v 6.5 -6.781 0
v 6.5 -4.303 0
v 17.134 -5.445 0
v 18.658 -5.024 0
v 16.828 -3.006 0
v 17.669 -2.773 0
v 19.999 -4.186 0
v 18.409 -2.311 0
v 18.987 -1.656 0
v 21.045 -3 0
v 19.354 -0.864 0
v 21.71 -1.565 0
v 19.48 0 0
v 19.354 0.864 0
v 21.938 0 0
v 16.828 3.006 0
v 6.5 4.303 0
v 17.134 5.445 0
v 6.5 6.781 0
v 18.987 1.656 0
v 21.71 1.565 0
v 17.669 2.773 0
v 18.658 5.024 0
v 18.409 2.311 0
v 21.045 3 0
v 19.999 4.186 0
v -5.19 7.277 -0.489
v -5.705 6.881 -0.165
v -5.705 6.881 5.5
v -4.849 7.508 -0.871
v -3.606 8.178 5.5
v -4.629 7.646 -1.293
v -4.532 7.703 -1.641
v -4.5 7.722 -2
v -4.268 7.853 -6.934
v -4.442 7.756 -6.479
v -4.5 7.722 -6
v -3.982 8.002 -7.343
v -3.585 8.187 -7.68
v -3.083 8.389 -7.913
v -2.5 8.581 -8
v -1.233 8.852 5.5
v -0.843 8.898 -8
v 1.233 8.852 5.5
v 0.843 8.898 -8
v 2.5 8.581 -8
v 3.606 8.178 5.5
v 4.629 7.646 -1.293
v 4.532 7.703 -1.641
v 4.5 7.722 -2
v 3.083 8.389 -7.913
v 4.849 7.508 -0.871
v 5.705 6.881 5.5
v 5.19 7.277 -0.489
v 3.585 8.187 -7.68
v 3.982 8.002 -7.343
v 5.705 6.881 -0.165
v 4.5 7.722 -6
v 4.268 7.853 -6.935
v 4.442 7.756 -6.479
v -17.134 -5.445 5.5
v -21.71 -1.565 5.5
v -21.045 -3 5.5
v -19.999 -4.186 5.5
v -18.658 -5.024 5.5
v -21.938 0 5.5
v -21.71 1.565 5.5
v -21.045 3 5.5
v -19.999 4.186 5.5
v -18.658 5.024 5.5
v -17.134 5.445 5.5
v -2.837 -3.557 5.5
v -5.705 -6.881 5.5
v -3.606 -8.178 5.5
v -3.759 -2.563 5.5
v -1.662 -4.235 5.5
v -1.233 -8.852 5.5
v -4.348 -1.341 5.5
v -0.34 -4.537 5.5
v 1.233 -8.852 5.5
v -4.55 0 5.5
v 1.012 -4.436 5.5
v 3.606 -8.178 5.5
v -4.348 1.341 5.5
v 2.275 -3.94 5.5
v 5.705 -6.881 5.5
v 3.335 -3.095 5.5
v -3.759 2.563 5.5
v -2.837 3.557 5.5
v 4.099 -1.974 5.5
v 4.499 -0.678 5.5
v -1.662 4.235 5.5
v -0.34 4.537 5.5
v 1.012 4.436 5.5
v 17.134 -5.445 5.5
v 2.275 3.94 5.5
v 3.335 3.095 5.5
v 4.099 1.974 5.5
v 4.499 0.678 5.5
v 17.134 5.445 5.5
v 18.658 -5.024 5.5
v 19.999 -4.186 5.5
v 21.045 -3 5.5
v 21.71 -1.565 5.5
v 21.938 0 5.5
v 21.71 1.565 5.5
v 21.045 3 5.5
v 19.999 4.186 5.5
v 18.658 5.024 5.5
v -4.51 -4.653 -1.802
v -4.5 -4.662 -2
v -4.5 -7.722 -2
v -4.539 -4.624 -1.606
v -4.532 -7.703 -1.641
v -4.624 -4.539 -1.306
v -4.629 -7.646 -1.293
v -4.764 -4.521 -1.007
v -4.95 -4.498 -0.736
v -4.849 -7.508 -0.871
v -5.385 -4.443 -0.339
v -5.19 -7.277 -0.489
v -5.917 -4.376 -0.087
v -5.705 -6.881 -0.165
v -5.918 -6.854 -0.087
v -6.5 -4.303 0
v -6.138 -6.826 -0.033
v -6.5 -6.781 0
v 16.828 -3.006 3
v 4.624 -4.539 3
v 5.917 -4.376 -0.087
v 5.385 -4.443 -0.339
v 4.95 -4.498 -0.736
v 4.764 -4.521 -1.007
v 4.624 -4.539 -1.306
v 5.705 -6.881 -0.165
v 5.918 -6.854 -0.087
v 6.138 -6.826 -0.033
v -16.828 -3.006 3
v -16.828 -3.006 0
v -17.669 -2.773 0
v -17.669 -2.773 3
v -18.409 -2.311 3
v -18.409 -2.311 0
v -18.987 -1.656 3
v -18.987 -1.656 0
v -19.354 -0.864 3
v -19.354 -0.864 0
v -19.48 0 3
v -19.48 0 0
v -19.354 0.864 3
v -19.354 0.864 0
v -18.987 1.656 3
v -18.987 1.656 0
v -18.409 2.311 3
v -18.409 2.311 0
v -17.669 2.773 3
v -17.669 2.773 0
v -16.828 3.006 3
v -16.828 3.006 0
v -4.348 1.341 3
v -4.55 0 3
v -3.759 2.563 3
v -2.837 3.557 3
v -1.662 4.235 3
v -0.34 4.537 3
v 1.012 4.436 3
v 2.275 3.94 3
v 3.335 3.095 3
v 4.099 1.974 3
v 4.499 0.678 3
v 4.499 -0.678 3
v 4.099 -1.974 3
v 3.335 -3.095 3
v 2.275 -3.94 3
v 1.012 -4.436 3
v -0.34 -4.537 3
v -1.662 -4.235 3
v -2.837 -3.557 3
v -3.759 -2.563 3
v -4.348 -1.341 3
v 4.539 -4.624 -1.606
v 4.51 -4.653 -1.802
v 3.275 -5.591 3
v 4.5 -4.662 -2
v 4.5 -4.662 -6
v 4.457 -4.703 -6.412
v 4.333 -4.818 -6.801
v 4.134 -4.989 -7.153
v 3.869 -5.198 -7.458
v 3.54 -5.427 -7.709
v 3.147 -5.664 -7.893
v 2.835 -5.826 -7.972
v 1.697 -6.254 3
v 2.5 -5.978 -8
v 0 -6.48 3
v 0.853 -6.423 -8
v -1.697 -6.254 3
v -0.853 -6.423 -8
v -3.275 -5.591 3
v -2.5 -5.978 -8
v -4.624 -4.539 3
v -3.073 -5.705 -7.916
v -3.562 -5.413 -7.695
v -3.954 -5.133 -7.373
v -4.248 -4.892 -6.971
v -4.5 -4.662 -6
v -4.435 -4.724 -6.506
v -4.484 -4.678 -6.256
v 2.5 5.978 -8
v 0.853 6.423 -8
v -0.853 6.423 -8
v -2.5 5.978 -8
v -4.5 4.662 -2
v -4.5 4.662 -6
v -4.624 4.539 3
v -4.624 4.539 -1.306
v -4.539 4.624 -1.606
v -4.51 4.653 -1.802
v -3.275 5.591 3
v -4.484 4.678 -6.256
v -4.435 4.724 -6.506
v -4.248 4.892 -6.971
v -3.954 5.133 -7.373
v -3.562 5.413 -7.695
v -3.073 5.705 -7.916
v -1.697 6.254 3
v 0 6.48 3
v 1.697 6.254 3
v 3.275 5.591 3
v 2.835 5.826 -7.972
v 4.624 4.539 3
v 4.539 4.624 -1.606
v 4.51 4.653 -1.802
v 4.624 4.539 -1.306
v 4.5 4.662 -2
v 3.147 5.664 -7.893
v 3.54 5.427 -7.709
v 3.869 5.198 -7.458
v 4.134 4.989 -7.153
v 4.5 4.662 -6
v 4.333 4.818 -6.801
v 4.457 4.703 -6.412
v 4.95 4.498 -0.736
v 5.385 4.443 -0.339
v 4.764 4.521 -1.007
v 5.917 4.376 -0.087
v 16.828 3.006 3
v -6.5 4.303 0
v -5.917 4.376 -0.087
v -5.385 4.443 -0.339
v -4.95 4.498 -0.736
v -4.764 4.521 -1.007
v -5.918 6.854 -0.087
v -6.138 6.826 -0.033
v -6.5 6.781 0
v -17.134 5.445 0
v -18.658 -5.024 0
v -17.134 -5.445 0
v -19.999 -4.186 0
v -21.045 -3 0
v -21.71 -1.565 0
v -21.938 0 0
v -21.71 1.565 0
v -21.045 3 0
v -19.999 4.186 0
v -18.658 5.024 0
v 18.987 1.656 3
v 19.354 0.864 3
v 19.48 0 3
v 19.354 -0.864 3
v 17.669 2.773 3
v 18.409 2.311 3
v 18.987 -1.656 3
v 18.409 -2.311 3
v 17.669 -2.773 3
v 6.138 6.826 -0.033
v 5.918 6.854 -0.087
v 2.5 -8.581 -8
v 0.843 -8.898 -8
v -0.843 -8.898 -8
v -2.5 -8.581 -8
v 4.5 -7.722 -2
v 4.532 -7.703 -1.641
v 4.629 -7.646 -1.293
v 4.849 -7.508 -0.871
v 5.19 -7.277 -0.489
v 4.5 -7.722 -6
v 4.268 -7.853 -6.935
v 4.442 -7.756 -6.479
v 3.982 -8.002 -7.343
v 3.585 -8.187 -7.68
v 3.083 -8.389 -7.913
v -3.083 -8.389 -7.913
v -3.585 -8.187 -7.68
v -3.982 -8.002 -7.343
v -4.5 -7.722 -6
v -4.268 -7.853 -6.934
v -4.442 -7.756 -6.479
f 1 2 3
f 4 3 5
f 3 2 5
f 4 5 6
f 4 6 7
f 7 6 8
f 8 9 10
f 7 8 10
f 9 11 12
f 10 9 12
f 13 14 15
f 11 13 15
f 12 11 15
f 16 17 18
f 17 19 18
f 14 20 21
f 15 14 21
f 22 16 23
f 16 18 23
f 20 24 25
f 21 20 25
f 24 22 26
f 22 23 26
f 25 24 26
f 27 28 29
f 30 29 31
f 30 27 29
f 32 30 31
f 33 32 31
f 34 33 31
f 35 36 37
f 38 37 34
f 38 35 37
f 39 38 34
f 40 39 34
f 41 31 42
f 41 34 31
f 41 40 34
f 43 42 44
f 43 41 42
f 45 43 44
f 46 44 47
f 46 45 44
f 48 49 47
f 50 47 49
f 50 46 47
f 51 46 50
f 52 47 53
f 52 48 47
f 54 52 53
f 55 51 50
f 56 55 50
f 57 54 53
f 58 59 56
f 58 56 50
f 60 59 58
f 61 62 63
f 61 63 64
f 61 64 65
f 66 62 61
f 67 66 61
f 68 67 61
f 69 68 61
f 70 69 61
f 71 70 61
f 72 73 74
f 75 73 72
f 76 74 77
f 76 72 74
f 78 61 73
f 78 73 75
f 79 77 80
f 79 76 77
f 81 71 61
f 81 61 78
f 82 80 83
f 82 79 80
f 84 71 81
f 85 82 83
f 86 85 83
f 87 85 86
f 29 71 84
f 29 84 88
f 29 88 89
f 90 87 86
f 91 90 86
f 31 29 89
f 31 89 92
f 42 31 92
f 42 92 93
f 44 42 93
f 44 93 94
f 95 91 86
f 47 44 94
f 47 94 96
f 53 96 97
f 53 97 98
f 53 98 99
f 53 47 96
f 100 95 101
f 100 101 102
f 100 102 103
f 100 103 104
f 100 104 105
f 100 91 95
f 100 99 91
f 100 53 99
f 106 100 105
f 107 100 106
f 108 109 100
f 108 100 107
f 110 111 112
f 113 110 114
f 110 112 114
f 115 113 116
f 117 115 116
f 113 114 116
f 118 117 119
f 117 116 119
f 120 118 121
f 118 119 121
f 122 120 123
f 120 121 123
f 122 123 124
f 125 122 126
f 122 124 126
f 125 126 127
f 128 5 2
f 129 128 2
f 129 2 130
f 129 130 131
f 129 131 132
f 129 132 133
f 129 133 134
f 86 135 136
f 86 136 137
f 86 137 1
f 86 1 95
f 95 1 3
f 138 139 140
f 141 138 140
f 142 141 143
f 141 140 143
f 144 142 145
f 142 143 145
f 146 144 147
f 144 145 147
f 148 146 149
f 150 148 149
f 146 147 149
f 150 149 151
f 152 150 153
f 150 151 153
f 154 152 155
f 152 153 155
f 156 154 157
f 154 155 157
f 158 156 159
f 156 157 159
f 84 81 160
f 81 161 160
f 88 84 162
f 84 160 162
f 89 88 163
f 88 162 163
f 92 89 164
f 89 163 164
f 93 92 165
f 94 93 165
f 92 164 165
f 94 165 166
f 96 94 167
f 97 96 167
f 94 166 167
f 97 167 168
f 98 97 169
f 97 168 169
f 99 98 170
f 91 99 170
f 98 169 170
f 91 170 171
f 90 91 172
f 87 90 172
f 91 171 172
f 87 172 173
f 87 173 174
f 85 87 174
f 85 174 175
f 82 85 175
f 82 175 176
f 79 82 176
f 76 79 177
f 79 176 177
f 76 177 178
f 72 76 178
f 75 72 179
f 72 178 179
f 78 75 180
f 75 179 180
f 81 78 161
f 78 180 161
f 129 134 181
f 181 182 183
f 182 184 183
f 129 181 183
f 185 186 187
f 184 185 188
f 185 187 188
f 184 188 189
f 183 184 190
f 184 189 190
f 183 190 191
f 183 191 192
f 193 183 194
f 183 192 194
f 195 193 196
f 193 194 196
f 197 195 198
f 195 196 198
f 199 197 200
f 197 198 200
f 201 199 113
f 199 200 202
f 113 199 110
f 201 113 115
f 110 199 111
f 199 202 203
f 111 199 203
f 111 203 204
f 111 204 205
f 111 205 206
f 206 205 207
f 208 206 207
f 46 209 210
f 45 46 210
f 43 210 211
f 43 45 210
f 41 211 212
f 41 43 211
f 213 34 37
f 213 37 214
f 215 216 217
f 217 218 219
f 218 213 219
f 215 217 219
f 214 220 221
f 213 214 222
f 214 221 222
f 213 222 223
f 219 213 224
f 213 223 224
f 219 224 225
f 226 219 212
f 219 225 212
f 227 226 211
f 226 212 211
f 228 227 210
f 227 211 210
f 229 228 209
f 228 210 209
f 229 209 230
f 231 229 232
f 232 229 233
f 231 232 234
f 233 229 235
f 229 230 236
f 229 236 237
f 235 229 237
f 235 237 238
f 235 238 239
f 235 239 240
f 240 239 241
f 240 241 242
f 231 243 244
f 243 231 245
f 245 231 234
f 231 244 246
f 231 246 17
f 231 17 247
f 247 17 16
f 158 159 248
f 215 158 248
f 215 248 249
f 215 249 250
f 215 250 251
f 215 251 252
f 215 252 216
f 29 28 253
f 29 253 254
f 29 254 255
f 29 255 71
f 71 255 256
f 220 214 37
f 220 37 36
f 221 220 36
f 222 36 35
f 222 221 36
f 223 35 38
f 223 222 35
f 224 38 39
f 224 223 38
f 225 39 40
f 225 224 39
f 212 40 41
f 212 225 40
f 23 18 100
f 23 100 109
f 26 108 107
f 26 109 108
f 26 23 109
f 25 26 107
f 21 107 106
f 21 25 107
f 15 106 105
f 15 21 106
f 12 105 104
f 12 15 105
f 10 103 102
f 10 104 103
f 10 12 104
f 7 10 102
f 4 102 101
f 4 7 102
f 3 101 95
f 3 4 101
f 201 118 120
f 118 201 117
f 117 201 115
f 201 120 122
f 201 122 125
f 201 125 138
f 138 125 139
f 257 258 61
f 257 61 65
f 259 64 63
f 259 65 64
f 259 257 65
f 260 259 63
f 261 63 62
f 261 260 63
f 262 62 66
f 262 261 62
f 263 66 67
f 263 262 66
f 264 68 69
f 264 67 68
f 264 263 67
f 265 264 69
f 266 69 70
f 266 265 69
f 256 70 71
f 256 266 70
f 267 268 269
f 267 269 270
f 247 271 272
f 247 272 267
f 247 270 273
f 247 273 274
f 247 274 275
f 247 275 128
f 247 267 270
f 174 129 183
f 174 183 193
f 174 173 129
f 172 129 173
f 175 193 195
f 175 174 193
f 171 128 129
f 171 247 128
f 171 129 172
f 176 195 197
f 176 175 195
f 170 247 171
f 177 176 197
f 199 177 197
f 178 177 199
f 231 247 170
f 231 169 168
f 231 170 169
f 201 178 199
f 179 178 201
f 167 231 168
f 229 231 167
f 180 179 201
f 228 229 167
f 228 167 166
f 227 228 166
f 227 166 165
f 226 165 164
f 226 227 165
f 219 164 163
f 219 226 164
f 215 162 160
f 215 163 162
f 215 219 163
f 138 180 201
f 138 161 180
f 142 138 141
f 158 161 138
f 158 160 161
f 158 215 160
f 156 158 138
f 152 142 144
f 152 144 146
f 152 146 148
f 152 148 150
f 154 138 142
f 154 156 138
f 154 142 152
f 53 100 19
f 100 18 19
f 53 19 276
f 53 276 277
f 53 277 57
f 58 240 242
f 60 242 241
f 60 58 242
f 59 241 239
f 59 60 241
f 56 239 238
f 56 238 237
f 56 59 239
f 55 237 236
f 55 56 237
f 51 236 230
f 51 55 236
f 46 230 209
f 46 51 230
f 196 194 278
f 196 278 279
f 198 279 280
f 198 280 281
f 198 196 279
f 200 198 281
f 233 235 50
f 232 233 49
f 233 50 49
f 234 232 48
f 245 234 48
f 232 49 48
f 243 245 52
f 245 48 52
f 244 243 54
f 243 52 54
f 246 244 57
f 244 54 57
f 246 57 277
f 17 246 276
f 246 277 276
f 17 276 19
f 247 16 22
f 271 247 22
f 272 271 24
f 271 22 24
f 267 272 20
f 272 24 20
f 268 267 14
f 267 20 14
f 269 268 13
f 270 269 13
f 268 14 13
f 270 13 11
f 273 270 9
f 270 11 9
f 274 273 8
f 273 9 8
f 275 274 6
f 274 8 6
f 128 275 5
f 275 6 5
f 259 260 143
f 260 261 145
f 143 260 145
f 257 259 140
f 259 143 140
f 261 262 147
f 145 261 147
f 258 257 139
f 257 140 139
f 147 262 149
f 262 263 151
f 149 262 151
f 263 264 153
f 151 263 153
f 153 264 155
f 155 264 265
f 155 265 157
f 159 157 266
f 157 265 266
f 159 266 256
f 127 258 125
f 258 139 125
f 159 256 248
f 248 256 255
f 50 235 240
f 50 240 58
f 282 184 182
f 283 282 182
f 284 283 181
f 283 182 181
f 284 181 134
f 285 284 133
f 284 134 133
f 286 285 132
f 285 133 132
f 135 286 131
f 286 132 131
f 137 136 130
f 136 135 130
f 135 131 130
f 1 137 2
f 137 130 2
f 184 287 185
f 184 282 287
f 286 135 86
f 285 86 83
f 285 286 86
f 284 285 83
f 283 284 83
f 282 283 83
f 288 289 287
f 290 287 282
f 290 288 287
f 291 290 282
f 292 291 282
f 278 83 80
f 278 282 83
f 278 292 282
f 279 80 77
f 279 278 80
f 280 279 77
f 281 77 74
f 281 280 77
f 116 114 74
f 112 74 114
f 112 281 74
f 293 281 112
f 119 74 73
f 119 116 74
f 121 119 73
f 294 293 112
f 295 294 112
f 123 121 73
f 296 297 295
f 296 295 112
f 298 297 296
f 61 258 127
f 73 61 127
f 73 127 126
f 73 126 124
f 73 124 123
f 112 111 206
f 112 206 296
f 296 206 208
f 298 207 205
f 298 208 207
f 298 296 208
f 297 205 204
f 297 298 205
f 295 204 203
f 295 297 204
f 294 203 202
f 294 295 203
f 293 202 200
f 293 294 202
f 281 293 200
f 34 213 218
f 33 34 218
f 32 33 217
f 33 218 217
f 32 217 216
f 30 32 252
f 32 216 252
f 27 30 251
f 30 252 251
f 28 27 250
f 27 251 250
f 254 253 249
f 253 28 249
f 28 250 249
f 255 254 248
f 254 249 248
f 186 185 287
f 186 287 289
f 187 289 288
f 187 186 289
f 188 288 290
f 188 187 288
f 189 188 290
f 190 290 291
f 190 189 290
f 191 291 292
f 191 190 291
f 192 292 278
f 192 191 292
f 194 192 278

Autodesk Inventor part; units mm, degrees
ref_plane "YZ Plane" through (0, 0, 0) normal (1, 0, 0) x (0, 1, 0)
ref_plane "XZ Plane" through (0, 0, 0) normal (0, 1, 0) x (-1, 0, 0)
ref_plane "XY Plane" through (0, 0, 0) normal (0, 0, 1) x (1, 0, 0)
sketch "bASE" plane through (0, 0, 0) normal (0, 0, 1) x (1, 0, 0)
  arc A0 (-16.7865, 2.679) -> (-16.7865, -2.679) centre (-16.45, 0) ccw
  arc A1 (16.7865, -2.679) -> (16.7865, 2.679) centre (16.45, 0) ccw
  line L0 (4.4678, -4.2262) -> (16.7865, -2.679)
  line L1 (4.4678, 4.2262) -> (16.7865, 2.679)
  line L2 (-4.4678, 4.2262) -> (-16.7865, 2.679)
  line L3 (-4.4678, -4.2262) -> (-16.7865, -2.679)
  arc A2 (-4.4678, -4.2262) -> (4.4678, -4.2262) centre (0, 0) ccw
  arc A3 (4.4678, 4.2262) -> (-4.4678, 4.2262) centre (0, 0) ccw
  point P0 (0, 4.2262)
  dimension "d20" = 5.4
  dimension "d21" = 5.4
sketch "Coupling" plane through (0, 0, 0) normal (0, 0, 1) x (1, 0, 0)
  line L0 (-4.4678, 4.2262) -> (-16.7865, 2.679) projected
  arc A0 (4.4678, 4.2262) -> (-4.4678, 4.2262) centre (0, 0) ccw projected
  line L1 (4.4678, 4.2262) -> (16.7865, 2.679) projected
  arc A1 (16.7865, -2.679) -> (16.7865, 2.679) centre (16.45, 0) ccw projected
  line L2 (4.4678, -4.2262) -> (16.7865, -2.679) projected
  arc A2 (-4.4678, -4.2262) -> (4.4678, -4.2262) centre (0, 0) ccw projected
  line L3 (-4.4678, -4.2262) -> (-16.7865, -2.679) projected
  arc A3 (-16.7865, 2.679) -> (-16.7865, -2.679) centre (-16.45, 0) ccw projected
  line L4 (17.1339, 5.4452) -> (5.7046, 6.8807)
  arc A4 (5.7046, 6.8807) -> (-5.7046, 6.8807) centre (0, 0) ccw
  line L5 (-5.7046, 6.8807) -> (-17.1339, 5.4452)
  arc A5 (-17.1339, 5.4452) -> (-17.1339, -5.4452) centre (-16.45, 0) ccw
  line L6 (-17.1339, -5.4452) -> (-5.7046, -6.8807)
  arc A6 (-5.7046, -6.8807) -> (5.7046, -6.8807) centre (0, 0) ccw
  line L7 (5.7046, -6.8807) -> (17.1339, -5.4452)
  arc A7 (17.1339, -5.4452) -> (17.1339, 5.4452) centre (16.45, 0) ccw
extrude "Extrusion7" add sketch "Coupling" along normal blind 5.5 contours A0 L1 A1 L2 A2 L3 A3 L0 | A7 L7 A6 L6 A5 L5 A4 L4
extrude "Extrusion8" cut sketch "bASE" along normal blind 3
sketch "Sketch8" plane through (0, 0, 3) normal (0, 0, -1) x (-1, 0, 0)
  arc A0 (-4.4678, -4.2262) -> (4.4678, -4.2262) centre (0, 0) ccw projected
  circle A1 centre (0, 0) radius 4.55
  dimension "d26" = 9.1
extrude "Extrusion9" cut sketch "Sketch8" against normal blind 3
sketch "Sketch9" plane through (0, 0, 0) normal (0, 0, -1) x (-1, 0, 0)
  arc A0 (4.4678, 4.2262) -> (-4.4678, 4.2262) centre (0, 0) ccw projected
  line L0 (4.4678, 4.2262) -> (16.7865, 2.679) projected
  arc A1 (16.7865, -2.679) -> (16.7865, 2.679) centre (16.45, 0) ccw projected
  line L1 (16.7865, -2.679) -> (4.4678, -4.2262) projected
  arc A2 (-4.4678, -4.2262) -> (4.4678, -4.2262) centre (0, 0) ccw projected
  line L2 (-4.4678, -4.2262) -> (-16.7865, -2.679) projected
  arc A3 (-16.7865, 2.679) -> (-16.7865, -2.679) centre (-16.45, 0) ccw projected
  line L3 (-16.7865, 2.679) -> (-4.4678, 4.2262) projected
  line L4 (16.8276, 3.0059) -> (4.6244, 4.5387)
  arc A4 (4.6244, 4.5387) -> (-4.6244, 4.5387) centre (0, 0) ccw
  line L5 (-4.6244, 4.5387) -> (-16.8276, 3.0059)
  arc A5 (-16.8276, 3.0059) -> (-16.8276, -3.0059) centre (-16.45, 0) ccw
  line L6 (-16.8276, -3.0059) -> (-4.6244, -4.5387)
  arc A6 (-4.6244, -4.5387) -> (4.6244, -4.5387) centre (0, 0) ccw
  line L7 (4.6244, -4.5387) -> (16.8276, -3.0059)
  arc A7 (16.8276, -3.0059) -> (16.8276, 3.0059) centre (16.45, 0) ccw
extrude "Extrusion10" cut sketch "Sketch9" against normal up to surface (3 mm away)
sketch "Sketch10" plane through (0, 0, 0) normal (0, 0, -1) x (-1, 0, 0)
  arc A0 (-4.6244, -4.5387) -> (4.6244, -4.5387) centre (0, 0) ccw projected
  line L0 (-4.6244, -4.5387) -> (-16.8276, -3.0059) projected
  line L1 (-16.8276, 3.0059) -> (-4.6244, 4.5387) projected
  arc A1 (4.6244, 4.5387) -> (-4.6244, 4.5387) centre (0, 0) ccw projected
  line L2 (4.6244, 4.5387) -> (16.8276, 3.0059) projected
  line L3 (16.8276, -3.0059) -> (4.6244, -4.5387) projected
  arc A2 (-5.7046, -6.8807) -> (5.7046, -6.8807) centre (0, 0) ccw projected
  arc A3 (5.7046, 6.8807) -> (-5.7046, 6.8807) centre (0, 0) ccw projected
  arc A4 (-4.6244, -4.5387) -> (4.6244, -4.5387) centre (0, 0) ccw
  arc A5 (4.6244, 4.5387) -> (-4.6244, 4.5387) centre (0, 0) ccw
  line L4 (4.5, 7.7225) -> (4.5, 4.662)
  line L5 (4.5, -4.662) -> (4.5, -7.7225)
  line L6 (-4.5, -7.7225) -> (-4.5, -4.662)
  line L7 (-4.5, 4.662) -> (-4.5, 7.7225)
  point P0 (4.5, 0)
extrude "Extrusion11" add sketch "Sketch10" along normal blind 8
sketch "Sketch11" plane through (0, 0, 0) normal (0, 1, 0) x (-1, 0, 0)
  arc A0 (-8.5, -3.2) -> (-11.5, -3.2) centre (-10, -4) ccw projected
  spline S0 degree 3 poles (-11.7, -4) (-11.7, -4.2199) (-11.655, -4.4494) (-11.4803, -4.8659) (-11.3506, -5.0536) (-11.0543, -5.3499) (-10.8664, -5.4801) (-10.4488, -5.6552) (-10.2188, -5.7) (-9.7812, -5.7) (-9.5512, -5.6552) (-9.1336, -5.4801) (-8.9457, -5.3499) (-8.6494, -5.0536) (-8.5197, -4.8659) (-8.345, -4.4494) (-8.3, -4.2199) (-8.3, -3.7801) (-8.345, -3.5506) (-8.5197, -3.1341) (-8.6494, -2.9464) (-8.9457, -2.6501) (-9.1336, -2.5199) (-9.5512, -2.3448) (-9.7812, -2.3) (-10.2188, -2.3) (-10.4488, -2.3448) (-10.8664, -2.5199) (-11.0543, -2.6501) (-11.3506, -2.9464) (-11.4803, -3.1341) (-11.655, -3.5506) (-11.7, -3.7801) (-11.7, -4) knots 0 0 0 0 0.065958 0.065958 0.131917 0.131917 0.197553 0.197553 0.263189 0.263189 0.328824 0.328824 0.39446 0.39446 0.460419 0.460419 0.526377 0.526377 0.592335 0.592335 0.658294 0.658294 0.72393 0.72393 0.789566 0.789566 0.855201 0.855201 0.920837 0.920837 0.986796 0.986796 1.052754 1.052754 1.052754 1.052754 projected
  point P0 (0, 0)
  point P1 (-11.7, -4)
extrude "Extrusion12" cut sketch "Sketch11" along normal through all both and the other way through all
fillet "Fillet1" radius 2 8 edges at (-4.5, 6.1923, 0) (-4.5, -6.1923, 0) (4.5, 6.1923, 0) (4.5, -6.1923, 0) (4.5, -6.1923, -8) (4.5, 6.1923, -8) (-4.5, 6.1923, -8) (-4.5, -6.1923, -8)
properties part number "ServoHornPocket2"
